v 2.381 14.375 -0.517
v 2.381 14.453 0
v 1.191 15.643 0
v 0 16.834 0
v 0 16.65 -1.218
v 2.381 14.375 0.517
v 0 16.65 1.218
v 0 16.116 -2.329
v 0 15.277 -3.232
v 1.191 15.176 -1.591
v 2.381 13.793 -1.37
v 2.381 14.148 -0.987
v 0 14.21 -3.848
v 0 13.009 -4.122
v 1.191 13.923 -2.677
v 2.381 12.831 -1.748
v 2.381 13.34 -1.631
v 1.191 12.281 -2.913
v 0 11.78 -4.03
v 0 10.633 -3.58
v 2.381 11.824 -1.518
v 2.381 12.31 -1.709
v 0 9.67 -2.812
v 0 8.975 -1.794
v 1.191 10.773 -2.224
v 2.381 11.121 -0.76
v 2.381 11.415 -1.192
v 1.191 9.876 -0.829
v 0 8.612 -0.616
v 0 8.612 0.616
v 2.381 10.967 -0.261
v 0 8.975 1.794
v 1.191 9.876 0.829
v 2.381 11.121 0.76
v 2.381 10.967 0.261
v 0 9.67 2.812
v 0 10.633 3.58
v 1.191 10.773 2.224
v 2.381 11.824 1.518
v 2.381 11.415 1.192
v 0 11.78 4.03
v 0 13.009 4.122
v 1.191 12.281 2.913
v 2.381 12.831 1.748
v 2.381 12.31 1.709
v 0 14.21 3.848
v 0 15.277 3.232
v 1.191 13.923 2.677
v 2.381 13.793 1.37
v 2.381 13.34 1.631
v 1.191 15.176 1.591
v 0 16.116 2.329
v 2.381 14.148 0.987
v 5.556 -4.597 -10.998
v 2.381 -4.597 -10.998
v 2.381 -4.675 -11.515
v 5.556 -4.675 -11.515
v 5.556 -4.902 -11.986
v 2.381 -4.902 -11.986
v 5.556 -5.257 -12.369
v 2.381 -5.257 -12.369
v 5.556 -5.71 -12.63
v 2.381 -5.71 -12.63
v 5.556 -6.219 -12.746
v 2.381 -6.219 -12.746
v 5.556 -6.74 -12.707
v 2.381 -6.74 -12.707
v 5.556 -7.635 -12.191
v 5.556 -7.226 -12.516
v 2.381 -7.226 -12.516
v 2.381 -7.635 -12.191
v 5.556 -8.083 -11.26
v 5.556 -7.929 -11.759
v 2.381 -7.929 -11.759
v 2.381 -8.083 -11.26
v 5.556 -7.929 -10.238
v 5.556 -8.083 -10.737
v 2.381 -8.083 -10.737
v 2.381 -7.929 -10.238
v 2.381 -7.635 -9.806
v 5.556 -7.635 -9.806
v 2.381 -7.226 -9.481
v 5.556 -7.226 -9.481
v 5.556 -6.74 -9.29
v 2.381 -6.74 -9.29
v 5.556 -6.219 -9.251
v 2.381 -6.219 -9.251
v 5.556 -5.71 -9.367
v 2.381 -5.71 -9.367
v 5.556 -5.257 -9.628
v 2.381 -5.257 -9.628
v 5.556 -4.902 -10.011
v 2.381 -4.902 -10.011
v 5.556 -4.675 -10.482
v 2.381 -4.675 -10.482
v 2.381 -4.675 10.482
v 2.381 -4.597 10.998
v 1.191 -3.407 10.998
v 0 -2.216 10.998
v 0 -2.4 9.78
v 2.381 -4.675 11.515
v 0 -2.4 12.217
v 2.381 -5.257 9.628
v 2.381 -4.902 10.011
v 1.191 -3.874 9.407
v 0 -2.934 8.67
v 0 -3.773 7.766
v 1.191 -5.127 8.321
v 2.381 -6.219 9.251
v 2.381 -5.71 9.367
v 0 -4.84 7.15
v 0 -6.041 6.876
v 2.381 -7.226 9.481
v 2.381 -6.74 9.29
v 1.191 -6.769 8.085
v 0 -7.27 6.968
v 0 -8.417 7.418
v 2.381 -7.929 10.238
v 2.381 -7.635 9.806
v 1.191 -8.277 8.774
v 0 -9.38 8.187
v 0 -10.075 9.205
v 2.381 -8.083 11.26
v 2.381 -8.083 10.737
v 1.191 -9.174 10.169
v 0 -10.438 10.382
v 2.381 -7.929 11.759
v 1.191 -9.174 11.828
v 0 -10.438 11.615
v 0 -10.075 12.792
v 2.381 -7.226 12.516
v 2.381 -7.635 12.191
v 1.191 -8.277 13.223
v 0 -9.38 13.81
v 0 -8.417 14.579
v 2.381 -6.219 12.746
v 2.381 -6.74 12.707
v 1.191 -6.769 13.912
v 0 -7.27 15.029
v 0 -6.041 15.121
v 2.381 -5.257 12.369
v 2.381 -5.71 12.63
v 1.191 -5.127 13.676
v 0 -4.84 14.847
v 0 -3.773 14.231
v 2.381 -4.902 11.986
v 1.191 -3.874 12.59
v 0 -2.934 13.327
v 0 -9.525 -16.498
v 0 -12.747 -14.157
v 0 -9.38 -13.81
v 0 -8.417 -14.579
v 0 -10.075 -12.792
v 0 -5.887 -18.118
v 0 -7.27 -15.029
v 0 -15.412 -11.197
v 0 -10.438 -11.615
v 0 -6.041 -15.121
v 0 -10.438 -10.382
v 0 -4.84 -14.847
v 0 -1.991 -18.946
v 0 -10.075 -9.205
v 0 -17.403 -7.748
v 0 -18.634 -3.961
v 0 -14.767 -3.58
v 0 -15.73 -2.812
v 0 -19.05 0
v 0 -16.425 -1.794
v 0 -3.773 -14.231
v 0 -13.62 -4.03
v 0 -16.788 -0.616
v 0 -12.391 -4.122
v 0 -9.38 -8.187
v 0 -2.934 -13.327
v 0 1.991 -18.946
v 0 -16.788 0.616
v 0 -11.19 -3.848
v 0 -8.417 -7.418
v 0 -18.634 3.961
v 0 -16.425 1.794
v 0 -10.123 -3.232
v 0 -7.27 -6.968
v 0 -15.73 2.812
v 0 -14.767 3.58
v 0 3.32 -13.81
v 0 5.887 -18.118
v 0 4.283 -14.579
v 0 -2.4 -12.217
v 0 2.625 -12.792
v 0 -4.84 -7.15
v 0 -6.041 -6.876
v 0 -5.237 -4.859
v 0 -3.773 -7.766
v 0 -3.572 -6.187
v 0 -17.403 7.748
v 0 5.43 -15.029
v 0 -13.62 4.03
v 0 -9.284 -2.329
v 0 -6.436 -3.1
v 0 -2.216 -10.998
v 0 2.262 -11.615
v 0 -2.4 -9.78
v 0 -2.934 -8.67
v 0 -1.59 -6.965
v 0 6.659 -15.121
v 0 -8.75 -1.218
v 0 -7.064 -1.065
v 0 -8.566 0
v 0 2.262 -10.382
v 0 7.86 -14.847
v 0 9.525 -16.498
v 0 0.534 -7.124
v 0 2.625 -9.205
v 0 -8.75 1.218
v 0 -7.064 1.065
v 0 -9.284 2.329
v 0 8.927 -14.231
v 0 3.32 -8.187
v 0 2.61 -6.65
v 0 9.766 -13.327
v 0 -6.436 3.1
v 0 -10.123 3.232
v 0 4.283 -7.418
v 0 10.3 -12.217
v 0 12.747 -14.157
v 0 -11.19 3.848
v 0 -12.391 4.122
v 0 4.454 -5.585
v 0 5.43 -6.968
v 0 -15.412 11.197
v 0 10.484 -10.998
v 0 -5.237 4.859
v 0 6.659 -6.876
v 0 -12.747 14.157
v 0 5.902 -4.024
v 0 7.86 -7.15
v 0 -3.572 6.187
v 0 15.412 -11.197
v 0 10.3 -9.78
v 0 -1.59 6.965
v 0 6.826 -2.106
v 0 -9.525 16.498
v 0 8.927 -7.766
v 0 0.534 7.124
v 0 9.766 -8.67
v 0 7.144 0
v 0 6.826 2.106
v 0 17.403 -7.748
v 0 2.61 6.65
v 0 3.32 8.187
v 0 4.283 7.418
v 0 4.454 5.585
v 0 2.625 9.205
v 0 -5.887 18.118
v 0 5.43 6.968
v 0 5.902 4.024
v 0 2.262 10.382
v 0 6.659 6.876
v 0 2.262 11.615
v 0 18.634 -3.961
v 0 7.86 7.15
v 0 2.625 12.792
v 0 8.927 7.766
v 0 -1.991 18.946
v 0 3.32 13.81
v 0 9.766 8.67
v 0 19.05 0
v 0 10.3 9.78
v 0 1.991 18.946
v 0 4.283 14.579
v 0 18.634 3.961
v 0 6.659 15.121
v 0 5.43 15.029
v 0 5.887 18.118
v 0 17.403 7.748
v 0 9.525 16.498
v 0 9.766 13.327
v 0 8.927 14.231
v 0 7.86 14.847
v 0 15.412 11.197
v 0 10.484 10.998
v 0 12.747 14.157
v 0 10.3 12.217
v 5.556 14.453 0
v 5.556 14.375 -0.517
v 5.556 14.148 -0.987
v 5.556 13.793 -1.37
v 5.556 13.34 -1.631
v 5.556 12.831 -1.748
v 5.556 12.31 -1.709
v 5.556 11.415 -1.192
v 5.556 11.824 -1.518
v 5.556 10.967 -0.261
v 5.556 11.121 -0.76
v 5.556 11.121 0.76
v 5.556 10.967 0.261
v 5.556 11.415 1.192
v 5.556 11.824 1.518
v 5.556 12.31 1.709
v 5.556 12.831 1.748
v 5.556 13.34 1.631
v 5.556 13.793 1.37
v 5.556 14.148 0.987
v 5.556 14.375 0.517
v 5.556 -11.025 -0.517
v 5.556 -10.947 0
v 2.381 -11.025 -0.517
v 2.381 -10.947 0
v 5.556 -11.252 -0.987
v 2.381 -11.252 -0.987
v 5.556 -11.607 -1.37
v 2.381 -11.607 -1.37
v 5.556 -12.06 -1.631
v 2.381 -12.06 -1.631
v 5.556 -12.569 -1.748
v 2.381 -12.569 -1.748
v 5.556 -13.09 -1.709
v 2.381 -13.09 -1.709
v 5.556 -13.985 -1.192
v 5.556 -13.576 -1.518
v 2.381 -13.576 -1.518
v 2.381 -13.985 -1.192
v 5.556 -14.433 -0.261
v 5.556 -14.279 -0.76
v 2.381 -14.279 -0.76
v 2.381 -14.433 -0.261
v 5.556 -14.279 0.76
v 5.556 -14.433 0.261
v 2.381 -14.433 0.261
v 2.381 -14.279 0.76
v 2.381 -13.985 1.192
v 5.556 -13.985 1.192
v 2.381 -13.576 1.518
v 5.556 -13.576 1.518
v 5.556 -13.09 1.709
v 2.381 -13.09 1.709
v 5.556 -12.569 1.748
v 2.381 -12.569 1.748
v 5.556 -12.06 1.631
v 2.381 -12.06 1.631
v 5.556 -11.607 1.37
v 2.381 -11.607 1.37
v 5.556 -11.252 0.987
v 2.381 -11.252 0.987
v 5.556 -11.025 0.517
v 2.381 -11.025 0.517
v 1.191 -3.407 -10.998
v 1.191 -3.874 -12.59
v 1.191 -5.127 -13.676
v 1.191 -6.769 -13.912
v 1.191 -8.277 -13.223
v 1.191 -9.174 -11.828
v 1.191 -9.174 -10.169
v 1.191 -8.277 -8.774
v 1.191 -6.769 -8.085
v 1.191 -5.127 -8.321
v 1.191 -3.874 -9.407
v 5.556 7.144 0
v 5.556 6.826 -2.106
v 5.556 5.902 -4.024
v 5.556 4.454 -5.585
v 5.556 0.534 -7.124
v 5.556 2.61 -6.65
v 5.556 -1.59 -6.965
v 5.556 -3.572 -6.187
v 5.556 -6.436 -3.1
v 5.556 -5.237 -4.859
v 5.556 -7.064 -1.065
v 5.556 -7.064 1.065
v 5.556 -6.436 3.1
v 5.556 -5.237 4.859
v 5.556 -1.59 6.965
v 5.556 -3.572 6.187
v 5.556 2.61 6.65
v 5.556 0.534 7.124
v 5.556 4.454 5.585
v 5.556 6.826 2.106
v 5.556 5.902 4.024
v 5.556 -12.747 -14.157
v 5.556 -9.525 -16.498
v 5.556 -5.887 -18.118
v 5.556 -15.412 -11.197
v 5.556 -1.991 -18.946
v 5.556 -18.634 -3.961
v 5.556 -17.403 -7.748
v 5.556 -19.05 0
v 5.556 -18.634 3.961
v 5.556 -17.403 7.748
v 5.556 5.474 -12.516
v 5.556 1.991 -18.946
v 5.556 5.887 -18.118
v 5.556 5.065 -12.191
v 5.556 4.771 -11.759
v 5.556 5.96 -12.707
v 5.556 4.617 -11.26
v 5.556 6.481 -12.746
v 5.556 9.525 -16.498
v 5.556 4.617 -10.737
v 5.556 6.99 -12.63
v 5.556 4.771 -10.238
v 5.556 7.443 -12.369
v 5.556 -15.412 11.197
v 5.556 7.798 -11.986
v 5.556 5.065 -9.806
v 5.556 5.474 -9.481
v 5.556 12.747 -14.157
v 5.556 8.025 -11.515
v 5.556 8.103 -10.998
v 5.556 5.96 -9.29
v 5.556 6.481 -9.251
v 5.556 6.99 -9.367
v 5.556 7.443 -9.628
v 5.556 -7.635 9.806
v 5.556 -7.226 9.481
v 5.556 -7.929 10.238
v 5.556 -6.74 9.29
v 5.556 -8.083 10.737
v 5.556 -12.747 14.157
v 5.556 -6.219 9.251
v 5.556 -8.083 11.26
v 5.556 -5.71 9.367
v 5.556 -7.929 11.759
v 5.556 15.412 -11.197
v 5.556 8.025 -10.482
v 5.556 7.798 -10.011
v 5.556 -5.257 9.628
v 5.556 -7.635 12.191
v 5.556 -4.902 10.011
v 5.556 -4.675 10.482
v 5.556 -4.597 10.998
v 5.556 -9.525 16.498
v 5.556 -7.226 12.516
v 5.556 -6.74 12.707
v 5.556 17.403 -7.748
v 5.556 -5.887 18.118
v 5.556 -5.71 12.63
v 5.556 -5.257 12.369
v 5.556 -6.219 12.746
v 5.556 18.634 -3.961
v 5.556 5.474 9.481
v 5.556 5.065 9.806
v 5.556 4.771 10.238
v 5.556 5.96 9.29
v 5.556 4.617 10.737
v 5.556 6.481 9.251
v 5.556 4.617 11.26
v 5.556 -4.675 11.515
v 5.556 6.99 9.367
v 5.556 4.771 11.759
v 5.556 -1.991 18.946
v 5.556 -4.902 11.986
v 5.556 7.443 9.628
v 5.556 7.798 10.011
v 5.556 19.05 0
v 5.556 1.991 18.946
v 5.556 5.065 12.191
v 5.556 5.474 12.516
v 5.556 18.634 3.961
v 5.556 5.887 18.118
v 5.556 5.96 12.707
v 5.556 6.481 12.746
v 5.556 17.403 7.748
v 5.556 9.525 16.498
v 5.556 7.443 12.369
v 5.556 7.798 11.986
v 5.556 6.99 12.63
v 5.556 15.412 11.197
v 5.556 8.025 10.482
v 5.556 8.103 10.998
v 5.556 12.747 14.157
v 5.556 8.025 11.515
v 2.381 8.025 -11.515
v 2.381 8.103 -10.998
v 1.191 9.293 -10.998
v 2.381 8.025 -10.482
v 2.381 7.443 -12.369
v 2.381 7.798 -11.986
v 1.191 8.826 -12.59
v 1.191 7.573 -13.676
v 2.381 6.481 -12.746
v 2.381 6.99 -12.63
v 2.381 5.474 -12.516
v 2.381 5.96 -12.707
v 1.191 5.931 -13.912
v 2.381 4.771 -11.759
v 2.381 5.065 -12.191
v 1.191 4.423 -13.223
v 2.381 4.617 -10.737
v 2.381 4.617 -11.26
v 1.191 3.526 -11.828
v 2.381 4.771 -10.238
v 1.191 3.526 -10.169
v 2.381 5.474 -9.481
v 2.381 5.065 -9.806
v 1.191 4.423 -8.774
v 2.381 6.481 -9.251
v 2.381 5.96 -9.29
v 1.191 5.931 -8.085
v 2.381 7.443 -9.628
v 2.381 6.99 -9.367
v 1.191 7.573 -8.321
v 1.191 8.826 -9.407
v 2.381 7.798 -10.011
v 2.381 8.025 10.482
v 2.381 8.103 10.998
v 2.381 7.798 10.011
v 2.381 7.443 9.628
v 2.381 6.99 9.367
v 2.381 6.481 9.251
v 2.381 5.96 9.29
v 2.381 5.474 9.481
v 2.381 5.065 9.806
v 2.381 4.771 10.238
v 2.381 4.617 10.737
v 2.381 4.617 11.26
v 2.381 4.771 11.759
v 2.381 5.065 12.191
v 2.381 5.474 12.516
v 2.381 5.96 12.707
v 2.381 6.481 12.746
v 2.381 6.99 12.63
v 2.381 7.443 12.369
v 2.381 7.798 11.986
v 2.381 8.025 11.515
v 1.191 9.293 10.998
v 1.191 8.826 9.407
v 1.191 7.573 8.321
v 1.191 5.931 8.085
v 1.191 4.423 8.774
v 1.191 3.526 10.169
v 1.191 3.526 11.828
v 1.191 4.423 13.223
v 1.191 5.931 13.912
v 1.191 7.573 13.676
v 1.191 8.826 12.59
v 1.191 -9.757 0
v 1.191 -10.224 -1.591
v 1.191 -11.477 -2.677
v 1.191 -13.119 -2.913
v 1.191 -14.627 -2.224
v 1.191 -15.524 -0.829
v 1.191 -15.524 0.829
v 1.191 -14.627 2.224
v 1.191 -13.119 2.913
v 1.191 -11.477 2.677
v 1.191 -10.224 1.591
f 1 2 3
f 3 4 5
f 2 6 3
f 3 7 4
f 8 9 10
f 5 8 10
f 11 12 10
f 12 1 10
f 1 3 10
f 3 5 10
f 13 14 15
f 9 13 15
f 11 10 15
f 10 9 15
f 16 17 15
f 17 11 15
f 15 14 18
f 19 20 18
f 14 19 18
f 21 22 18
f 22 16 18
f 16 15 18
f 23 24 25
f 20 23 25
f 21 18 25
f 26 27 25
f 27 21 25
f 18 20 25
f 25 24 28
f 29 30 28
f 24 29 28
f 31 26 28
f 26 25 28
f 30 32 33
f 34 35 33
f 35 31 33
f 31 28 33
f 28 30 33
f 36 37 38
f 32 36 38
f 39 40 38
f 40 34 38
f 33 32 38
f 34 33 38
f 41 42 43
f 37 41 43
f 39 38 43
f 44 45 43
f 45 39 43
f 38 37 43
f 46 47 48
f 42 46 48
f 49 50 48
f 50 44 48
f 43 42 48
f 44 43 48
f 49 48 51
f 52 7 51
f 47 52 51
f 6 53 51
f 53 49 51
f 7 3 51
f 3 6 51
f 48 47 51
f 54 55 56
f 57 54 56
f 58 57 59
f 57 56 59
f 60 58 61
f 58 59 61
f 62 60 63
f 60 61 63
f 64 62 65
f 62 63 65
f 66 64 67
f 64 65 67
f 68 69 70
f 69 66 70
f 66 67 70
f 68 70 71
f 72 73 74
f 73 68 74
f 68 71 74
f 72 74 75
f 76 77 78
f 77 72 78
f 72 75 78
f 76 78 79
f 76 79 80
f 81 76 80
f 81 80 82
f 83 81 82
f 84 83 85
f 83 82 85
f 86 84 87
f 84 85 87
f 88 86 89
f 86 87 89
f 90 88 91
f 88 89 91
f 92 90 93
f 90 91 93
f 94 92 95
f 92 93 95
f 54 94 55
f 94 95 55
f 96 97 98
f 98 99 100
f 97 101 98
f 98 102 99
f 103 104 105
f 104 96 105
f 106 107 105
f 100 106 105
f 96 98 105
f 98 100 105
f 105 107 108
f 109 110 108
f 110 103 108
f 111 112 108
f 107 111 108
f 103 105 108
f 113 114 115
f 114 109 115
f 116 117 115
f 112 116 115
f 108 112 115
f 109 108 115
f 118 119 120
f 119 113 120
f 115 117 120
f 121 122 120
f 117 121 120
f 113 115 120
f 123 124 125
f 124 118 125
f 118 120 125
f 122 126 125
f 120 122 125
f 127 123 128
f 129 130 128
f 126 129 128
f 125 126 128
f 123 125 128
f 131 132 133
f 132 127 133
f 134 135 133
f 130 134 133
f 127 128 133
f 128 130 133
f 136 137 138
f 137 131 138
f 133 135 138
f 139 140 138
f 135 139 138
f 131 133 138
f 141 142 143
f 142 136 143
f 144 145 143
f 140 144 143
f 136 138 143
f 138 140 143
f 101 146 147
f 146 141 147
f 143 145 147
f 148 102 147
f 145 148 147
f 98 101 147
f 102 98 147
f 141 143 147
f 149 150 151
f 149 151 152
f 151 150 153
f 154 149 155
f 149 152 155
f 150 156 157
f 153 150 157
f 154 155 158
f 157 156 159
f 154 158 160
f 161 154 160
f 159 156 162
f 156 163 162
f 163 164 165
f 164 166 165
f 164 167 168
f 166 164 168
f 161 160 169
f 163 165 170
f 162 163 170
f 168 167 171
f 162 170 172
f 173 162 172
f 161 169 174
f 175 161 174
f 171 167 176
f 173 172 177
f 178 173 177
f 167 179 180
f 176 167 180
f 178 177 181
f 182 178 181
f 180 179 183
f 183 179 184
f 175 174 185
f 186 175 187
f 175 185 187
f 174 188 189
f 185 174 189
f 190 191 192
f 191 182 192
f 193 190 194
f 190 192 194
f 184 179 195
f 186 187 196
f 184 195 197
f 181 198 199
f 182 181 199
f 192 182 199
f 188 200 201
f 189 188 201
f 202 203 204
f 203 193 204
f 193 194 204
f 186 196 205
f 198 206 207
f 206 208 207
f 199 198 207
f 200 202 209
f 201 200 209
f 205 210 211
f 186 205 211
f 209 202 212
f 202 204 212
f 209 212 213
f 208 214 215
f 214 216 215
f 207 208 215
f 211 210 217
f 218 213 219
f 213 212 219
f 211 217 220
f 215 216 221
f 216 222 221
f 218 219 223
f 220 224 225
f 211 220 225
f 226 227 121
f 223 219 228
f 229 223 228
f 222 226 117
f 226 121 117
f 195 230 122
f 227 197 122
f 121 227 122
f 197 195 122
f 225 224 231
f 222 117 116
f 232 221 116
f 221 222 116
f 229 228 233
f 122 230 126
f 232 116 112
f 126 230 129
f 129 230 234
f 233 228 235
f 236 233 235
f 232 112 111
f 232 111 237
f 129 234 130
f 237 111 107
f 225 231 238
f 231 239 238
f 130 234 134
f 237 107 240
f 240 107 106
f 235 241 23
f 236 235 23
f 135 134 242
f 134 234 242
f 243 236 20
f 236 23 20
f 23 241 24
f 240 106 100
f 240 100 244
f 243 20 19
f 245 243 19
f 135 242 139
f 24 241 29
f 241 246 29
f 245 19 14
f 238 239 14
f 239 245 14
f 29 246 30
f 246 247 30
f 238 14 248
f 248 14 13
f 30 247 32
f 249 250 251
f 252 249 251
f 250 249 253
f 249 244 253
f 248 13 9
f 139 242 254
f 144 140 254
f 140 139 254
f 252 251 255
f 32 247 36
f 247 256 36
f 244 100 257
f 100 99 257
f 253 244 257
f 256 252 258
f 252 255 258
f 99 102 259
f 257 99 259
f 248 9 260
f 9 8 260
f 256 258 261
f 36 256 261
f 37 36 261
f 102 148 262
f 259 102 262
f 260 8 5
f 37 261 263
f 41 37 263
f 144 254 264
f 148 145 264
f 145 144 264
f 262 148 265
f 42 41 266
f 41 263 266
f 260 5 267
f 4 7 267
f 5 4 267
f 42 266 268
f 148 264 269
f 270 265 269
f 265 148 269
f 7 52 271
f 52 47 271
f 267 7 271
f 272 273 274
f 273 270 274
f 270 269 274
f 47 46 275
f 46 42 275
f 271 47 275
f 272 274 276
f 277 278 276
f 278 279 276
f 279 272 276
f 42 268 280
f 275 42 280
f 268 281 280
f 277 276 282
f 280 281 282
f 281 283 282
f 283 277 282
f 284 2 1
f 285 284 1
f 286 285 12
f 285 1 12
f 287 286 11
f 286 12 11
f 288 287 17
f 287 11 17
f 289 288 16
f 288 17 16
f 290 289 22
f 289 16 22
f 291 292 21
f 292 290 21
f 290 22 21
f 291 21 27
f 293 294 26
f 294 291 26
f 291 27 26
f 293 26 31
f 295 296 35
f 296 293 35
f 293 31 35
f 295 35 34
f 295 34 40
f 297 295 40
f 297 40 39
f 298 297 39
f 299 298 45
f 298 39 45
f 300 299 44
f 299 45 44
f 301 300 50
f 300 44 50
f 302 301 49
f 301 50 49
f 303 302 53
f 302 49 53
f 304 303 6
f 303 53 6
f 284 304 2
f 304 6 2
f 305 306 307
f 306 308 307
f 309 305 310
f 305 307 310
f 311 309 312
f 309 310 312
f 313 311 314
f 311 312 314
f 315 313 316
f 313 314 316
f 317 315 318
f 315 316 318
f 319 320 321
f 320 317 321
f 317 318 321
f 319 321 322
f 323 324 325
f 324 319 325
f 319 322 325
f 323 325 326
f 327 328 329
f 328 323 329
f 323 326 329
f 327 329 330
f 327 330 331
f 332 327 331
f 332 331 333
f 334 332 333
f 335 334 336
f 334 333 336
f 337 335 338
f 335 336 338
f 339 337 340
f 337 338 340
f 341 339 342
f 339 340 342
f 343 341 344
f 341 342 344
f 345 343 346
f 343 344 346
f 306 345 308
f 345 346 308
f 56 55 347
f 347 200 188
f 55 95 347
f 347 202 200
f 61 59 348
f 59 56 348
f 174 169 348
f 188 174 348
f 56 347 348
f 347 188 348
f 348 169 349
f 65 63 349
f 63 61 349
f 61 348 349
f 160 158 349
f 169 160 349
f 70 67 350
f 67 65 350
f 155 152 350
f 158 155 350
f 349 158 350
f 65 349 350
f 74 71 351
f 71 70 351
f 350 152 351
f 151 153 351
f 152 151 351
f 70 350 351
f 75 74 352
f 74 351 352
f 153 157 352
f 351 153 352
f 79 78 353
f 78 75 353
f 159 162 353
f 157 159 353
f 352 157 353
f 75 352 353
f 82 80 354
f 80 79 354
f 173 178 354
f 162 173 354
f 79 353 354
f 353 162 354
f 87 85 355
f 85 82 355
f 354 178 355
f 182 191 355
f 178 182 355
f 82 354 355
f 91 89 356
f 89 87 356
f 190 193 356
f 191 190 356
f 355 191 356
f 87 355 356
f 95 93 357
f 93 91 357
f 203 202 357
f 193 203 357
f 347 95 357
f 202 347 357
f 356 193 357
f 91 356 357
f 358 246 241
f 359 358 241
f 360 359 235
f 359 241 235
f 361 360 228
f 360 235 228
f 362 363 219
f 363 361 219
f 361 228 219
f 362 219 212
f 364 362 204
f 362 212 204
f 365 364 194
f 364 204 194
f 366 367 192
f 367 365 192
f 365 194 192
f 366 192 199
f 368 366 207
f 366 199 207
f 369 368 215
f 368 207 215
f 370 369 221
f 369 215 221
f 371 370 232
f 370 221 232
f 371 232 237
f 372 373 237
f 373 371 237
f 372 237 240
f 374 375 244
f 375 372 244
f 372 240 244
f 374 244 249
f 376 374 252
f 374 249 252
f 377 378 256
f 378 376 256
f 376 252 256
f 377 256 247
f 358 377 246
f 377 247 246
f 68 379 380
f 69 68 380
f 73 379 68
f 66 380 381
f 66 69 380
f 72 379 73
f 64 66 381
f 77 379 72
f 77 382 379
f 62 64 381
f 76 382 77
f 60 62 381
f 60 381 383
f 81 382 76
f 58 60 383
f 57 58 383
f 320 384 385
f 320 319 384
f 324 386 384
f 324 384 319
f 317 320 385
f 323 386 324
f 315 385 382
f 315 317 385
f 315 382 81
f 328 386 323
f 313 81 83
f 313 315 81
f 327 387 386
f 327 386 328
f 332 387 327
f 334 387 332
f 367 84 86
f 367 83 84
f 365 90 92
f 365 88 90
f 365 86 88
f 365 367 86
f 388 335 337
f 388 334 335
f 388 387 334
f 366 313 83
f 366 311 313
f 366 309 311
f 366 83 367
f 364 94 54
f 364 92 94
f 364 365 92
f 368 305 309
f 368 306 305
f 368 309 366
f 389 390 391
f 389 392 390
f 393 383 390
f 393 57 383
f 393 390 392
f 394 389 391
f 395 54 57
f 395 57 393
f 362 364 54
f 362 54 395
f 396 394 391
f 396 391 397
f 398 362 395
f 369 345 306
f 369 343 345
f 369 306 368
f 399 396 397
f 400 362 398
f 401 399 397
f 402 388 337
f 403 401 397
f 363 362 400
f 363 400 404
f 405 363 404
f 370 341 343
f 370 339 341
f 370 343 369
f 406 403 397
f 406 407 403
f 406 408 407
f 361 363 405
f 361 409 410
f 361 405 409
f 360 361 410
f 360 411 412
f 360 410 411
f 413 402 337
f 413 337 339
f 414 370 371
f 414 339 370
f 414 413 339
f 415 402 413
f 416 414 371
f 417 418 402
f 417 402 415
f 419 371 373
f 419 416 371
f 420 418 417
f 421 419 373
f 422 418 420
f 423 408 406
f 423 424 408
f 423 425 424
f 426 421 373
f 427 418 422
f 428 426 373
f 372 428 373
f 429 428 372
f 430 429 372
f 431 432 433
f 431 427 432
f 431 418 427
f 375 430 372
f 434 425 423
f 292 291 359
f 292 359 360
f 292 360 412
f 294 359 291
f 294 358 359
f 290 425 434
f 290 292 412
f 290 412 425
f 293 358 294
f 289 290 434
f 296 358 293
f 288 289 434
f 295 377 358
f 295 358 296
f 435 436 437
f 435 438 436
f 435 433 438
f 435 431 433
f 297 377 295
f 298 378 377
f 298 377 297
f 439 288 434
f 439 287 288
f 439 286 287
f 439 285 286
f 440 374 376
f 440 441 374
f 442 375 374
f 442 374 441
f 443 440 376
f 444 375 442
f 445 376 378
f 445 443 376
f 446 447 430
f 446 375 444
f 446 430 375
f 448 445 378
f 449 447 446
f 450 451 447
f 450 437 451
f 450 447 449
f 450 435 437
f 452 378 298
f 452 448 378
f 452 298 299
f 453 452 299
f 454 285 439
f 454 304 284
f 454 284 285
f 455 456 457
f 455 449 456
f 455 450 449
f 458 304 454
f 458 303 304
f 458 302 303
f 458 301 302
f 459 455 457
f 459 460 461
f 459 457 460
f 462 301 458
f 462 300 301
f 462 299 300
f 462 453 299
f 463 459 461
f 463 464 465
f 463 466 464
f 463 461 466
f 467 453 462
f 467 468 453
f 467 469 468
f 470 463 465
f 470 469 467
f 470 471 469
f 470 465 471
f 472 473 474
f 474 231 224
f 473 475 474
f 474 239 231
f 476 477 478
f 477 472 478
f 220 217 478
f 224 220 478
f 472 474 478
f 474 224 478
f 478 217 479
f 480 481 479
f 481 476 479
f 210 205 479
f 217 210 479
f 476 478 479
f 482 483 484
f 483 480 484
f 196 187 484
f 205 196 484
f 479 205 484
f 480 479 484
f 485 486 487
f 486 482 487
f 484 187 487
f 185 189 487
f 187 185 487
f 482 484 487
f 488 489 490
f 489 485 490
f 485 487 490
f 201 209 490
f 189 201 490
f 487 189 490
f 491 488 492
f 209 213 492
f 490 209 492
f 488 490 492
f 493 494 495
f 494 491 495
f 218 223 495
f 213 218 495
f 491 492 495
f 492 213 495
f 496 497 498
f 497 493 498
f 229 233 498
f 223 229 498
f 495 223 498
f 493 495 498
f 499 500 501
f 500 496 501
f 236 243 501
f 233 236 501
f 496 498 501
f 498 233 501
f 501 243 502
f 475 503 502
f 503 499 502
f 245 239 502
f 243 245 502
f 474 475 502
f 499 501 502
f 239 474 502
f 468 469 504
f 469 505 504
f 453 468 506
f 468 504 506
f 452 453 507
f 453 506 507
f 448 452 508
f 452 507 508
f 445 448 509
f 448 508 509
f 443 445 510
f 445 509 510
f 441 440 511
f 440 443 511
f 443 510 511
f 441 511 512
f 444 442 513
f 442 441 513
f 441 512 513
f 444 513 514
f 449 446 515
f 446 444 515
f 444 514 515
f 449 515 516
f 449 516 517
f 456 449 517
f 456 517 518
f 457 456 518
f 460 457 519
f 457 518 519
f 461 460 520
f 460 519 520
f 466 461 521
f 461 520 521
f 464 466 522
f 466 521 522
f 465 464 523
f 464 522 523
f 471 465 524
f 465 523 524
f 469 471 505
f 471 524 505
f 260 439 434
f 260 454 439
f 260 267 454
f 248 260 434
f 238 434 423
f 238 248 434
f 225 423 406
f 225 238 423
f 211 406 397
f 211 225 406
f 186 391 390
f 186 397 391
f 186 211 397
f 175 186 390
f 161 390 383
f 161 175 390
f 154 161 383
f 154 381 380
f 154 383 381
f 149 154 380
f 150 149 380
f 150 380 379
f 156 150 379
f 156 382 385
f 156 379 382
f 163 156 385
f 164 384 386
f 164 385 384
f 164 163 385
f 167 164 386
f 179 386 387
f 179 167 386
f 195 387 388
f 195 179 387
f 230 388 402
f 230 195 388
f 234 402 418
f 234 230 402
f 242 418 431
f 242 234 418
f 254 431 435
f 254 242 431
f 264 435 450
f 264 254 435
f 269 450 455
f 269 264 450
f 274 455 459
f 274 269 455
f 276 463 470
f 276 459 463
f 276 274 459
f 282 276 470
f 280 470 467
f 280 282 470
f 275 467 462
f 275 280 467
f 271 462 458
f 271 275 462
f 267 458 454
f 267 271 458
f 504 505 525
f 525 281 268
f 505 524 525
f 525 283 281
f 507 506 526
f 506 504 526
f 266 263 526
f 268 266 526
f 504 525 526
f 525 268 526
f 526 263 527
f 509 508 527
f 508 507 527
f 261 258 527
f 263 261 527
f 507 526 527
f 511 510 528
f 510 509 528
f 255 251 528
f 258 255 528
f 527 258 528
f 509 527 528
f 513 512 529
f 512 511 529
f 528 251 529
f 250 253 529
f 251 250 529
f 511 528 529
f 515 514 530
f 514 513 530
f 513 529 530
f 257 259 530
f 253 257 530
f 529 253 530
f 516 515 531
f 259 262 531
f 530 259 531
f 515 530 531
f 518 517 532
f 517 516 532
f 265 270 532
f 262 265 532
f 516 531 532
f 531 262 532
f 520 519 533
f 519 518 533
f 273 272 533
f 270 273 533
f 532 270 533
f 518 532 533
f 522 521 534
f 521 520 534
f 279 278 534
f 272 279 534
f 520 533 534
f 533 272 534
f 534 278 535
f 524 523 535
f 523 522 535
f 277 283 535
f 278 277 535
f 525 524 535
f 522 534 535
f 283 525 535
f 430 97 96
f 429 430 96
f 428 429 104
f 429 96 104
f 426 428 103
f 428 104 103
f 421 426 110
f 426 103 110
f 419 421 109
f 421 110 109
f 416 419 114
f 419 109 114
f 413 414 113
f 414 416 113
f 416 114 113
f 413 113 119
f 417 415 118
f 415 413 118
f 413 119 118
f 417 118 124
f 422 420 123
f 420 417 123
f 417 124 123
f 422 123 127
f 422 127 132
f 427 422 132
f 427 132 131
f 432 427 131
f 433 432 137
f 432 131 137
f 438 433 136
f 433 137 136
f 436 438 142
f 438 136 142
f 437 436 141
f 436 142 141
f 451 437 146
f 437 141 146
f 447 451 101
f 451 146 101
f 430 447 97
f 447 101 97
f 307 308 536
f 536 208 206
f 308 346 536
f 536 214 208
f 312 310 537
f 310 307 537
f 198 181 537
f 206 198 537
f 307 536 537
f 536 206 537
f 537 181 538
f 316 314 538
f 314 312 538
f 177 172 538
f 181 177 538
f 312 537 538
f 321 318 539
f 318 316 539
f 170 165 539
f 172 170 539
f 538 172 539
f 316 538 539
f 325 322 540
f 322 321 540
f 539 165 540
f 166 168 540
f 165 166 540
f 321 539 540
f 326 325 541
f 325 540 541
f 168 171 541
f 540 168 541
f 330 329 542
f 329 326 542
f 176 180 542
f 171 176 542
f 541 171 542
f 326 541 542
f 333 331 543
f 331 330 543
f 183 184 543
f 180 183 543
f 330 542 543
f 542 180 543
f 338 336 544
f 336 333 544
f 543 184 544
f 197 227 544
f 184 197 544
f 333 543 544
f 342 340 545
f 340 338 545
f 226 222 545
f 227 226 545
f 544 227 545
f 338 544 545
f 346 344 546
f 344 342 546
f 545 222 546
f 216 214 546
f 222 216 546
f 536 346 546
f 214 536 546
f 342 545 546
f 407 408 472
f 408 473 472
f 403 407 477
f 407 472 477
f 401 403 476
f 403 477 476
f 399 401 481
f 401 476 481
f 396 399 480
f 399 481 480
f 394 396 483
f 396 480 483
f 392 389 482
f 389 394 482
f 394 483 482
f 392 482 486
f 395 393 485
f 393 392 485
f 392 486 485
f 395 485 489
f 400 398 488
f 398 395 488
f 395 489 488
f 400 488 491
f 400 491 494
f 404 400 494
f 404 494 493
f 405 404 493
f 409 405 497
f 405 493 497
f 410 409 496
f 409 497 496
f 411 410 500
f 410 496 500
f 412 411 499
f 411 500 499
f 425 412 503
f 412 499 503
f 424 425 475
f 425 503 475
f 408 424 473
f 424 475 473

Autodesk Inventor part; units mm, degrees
ref_plane "YZ Plane" through (0, 0, 0) normal (1, 0, 0) x (0, 1, 0)
ref_plane "XZ Plane" through (0, 0, 0) normal (0, 1, 0) x (-1, 0, 0)
ref_plane "XY Plane" through (0, 0, 0) normal (0, 0, 1) x (1, 0, 0)
sketch "Sketch1" plane through (0, 0, 0) normal (1, 0, 0) x (0, 1, 0)
  circle A0 centre (0, 0) radius 7.1437
  circle A1 centre (0, 0) radius 19.05
  circle A2 centre (12.7, 0) radius 1.7526
  circle A3 centre (6.35, 10.9985) radius 1.7526
  circle A4 centre (-6.35, 10.9985) radius 1.7526
  circle A5 centre (-12.7, 0) radius 1.7526
  circle A6 centre (-6.35, -10.9985) radius 1.7526
  circle A7 centre (6.35, -10.9985) radius 1.7526
  dimension "d0" = 14.2875
  dimension "d1" = 38.1
  dimension "d4" = 3.5052
  dimension "d5" = 12.7
  dimension "d8" = 360
extrude "Extrusion1" add sketch "Sketch1" along normal blind 5.5563
chamfer "Chamfer1" distance 2.3813 angle 45 6 edges at (0, 10.9474, 0) (0, 4.5974, 10.9985) (0, -14.4526, 0) (0, -8.1026, 10.9985) (0, 4.5974, -10.9985) (0, -8.1026, -10.9985)
properties part number "Spacer 3-8x .125" material "UHMW, Black"
